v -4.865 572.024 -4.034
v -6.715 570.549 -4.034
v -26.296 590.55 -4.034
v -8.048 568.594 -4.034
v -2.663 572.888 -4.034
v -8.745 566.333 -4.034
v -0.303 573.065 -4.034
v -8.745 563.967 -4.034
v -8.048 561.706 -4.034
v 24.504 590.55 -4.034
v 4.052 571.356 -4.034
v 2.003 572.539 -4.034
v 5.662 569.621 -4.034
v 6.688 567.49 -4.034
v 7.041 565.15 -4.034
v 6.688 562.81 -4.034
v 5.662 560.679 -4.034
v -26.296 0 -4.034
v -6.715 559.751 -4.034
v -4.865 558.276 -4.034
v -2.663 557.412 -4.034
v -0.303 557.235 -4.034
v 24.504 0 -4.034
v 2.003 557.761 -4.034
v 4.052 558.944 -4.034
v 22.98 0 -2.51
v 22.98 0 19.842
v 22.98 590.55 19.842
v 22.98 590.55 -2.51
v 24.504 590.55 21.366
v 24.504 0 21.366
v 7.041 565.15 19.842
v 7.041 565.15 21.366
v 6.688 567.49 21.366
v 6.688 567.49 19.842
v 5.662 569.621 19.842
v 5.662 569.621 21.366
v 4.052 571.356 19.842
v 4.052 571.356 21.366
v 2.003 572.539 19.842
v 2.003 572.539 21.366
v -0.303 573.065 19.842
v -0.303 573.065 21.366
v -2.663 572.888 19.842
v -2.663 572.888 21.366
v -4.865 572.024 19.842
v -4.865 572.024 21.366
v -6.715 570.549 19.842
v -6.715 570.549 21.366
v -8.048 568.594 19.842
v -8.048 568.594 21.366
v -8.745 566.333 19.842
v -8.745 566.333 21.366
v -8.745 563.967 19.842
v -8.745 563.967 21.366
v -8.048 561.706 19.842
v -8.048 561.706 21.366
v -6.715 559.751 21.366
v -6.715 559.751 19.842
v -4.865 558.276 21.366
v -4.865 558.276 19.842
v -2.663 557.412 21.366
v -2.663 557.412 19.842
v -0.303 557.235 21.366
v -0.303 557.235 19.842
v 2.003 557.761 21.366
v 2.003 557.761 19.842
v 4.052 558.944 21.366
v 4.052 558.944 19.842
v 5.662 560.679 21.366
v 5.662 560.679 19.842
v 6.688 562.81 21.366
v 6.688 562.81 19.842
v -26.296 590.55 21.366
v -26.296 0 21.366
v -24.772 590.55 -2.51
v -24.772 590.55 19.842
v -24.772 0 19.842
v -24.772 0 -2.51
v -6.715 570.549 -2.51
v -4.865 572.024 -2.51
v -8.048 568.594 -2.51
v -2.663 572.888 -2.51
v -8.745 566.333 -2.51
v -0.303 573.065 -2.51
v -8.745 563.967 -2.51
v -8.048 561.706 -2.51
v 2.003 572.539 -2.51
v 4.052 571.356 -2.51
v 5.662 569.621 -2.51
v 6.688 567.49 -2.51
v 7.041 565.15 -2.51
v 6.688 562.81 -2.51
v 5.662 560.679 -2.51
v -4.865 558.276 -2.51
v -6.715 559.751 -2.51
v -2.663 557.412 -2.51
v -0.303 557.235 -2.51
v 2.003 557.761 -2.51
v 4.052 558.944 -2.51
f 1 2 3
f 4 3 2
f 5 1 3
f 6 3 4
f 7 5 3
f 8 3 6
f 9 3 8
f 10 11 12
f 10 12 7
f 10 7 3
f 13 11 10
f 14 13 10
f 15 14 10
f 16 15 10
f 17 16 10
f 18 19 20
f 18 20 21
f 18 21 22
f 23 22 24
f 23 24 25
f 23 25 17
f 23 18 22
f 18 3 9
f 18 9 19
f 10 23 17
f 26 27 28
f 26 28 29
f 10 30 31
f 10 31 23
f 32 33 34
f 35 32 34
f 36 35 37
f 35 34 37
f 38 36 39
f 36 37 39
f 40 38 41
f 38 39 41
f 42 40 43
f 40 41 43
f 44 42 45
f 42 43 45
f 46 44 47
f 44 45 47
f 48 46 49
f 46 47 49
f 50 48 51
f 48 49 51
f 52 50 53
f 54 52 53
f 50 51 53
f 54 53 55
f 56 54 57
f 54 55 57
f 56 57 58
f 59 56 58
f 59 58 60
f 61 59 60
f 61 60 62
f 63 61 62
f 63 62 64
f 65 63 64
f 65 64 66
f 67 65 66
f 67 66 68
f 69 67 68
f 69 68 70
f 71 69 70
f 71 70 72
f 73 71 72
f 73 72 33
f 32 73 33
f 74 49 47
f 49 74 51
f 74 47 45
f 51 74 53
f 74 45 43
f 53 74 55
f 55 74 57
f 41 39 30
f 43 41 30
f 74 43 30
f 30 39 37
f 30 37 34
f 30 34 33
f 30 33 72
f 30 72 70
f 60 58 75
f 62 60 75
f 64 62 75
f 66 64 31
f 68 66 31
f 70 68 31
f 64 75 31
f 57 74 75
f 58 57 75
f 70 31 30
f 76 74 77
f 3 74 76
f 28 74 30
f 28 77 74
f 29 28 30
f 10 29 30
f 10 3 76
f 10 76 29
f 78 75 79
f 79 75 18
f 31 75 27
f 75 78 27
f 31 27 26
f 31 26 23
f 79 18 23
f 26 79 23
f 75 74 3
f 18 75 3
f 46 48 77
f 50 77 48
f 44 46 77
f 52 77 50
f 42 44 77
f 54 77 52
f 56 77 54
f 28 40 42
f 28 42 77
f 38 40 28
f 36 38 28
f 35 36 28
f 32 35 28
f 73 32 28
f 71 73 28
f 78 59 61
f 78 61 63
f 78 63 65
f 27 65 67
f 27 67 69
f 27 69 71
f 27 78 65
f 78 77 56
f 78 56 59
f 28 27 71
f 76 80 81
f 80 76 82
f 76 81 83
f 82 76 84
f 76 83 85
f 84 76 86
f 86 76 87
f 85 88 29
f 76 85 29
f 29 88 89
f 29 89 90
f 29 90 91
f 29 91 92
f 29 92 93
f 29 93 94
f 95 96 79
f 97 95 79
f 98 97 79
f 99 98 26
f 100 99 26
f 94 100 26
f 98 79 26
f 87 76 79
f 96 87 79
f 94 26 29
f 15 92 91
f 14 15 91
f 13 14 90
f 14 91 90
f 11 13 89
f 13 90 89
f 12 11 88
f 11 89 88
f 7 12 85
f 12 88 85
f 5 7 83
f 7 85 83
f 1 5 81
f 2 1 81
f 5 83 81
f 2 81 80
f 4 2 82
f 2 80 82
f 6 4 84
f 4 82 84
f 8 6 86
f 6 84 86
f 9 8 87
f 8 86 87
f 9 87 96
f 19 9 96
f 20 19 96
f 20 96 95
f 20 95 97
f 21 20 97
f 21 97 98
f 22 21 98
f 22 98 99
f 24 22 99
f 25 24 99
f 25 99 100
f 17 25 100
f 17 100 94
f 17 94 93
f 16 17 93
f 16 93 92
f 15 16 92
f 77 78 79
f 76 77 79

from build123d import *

# Parameters (mm, degrees)
SKETCH1_W           = 50.8
SKETCH1_H           = 25.4
SKETCH1_W_2         = 47.752
SKETCH1_H_2         = 22.352
BOSS_EXTRUDE2_DEPTH = 590.55
SKETCH2_R           = 7.9375
CUT_EXTRUDE1_DEPTH  = 26.4


with BuildPart() as part:
    # Sketch1 → Boss-Extrude2 (new body)
    with BuildSketch(Plane(origin=(0, 0, 0), x_dir=(1, 0, 0), z_dir=(0, 1, 0))):
        with Locations((-0.896470588, -8.665882353)):
            Rectangle(SKETCH1_W, SKETCH1_H)
        with Locations((-0.896470588, -8.665882353)):
            Rectangle(SKETCH1_W_2, SKETCH1_H_2, mode=Mode.SUBTRACT)
    extrude(amount=BOSS_EXTRUDE2_DEPTH)

    # Sketch2 → Cut-Extrude1 (cut, through all)
    with BuildSketch(Plane.XY.offset(21.365882353)):
        with Locations((-0.896470588, 565.15)):
            Circle(SKETCH2_R)
    extrude(amount=-CUT_EXTRUDE1_DEPTH, mode=Mode.SUBTRACT)


solid = part.part
